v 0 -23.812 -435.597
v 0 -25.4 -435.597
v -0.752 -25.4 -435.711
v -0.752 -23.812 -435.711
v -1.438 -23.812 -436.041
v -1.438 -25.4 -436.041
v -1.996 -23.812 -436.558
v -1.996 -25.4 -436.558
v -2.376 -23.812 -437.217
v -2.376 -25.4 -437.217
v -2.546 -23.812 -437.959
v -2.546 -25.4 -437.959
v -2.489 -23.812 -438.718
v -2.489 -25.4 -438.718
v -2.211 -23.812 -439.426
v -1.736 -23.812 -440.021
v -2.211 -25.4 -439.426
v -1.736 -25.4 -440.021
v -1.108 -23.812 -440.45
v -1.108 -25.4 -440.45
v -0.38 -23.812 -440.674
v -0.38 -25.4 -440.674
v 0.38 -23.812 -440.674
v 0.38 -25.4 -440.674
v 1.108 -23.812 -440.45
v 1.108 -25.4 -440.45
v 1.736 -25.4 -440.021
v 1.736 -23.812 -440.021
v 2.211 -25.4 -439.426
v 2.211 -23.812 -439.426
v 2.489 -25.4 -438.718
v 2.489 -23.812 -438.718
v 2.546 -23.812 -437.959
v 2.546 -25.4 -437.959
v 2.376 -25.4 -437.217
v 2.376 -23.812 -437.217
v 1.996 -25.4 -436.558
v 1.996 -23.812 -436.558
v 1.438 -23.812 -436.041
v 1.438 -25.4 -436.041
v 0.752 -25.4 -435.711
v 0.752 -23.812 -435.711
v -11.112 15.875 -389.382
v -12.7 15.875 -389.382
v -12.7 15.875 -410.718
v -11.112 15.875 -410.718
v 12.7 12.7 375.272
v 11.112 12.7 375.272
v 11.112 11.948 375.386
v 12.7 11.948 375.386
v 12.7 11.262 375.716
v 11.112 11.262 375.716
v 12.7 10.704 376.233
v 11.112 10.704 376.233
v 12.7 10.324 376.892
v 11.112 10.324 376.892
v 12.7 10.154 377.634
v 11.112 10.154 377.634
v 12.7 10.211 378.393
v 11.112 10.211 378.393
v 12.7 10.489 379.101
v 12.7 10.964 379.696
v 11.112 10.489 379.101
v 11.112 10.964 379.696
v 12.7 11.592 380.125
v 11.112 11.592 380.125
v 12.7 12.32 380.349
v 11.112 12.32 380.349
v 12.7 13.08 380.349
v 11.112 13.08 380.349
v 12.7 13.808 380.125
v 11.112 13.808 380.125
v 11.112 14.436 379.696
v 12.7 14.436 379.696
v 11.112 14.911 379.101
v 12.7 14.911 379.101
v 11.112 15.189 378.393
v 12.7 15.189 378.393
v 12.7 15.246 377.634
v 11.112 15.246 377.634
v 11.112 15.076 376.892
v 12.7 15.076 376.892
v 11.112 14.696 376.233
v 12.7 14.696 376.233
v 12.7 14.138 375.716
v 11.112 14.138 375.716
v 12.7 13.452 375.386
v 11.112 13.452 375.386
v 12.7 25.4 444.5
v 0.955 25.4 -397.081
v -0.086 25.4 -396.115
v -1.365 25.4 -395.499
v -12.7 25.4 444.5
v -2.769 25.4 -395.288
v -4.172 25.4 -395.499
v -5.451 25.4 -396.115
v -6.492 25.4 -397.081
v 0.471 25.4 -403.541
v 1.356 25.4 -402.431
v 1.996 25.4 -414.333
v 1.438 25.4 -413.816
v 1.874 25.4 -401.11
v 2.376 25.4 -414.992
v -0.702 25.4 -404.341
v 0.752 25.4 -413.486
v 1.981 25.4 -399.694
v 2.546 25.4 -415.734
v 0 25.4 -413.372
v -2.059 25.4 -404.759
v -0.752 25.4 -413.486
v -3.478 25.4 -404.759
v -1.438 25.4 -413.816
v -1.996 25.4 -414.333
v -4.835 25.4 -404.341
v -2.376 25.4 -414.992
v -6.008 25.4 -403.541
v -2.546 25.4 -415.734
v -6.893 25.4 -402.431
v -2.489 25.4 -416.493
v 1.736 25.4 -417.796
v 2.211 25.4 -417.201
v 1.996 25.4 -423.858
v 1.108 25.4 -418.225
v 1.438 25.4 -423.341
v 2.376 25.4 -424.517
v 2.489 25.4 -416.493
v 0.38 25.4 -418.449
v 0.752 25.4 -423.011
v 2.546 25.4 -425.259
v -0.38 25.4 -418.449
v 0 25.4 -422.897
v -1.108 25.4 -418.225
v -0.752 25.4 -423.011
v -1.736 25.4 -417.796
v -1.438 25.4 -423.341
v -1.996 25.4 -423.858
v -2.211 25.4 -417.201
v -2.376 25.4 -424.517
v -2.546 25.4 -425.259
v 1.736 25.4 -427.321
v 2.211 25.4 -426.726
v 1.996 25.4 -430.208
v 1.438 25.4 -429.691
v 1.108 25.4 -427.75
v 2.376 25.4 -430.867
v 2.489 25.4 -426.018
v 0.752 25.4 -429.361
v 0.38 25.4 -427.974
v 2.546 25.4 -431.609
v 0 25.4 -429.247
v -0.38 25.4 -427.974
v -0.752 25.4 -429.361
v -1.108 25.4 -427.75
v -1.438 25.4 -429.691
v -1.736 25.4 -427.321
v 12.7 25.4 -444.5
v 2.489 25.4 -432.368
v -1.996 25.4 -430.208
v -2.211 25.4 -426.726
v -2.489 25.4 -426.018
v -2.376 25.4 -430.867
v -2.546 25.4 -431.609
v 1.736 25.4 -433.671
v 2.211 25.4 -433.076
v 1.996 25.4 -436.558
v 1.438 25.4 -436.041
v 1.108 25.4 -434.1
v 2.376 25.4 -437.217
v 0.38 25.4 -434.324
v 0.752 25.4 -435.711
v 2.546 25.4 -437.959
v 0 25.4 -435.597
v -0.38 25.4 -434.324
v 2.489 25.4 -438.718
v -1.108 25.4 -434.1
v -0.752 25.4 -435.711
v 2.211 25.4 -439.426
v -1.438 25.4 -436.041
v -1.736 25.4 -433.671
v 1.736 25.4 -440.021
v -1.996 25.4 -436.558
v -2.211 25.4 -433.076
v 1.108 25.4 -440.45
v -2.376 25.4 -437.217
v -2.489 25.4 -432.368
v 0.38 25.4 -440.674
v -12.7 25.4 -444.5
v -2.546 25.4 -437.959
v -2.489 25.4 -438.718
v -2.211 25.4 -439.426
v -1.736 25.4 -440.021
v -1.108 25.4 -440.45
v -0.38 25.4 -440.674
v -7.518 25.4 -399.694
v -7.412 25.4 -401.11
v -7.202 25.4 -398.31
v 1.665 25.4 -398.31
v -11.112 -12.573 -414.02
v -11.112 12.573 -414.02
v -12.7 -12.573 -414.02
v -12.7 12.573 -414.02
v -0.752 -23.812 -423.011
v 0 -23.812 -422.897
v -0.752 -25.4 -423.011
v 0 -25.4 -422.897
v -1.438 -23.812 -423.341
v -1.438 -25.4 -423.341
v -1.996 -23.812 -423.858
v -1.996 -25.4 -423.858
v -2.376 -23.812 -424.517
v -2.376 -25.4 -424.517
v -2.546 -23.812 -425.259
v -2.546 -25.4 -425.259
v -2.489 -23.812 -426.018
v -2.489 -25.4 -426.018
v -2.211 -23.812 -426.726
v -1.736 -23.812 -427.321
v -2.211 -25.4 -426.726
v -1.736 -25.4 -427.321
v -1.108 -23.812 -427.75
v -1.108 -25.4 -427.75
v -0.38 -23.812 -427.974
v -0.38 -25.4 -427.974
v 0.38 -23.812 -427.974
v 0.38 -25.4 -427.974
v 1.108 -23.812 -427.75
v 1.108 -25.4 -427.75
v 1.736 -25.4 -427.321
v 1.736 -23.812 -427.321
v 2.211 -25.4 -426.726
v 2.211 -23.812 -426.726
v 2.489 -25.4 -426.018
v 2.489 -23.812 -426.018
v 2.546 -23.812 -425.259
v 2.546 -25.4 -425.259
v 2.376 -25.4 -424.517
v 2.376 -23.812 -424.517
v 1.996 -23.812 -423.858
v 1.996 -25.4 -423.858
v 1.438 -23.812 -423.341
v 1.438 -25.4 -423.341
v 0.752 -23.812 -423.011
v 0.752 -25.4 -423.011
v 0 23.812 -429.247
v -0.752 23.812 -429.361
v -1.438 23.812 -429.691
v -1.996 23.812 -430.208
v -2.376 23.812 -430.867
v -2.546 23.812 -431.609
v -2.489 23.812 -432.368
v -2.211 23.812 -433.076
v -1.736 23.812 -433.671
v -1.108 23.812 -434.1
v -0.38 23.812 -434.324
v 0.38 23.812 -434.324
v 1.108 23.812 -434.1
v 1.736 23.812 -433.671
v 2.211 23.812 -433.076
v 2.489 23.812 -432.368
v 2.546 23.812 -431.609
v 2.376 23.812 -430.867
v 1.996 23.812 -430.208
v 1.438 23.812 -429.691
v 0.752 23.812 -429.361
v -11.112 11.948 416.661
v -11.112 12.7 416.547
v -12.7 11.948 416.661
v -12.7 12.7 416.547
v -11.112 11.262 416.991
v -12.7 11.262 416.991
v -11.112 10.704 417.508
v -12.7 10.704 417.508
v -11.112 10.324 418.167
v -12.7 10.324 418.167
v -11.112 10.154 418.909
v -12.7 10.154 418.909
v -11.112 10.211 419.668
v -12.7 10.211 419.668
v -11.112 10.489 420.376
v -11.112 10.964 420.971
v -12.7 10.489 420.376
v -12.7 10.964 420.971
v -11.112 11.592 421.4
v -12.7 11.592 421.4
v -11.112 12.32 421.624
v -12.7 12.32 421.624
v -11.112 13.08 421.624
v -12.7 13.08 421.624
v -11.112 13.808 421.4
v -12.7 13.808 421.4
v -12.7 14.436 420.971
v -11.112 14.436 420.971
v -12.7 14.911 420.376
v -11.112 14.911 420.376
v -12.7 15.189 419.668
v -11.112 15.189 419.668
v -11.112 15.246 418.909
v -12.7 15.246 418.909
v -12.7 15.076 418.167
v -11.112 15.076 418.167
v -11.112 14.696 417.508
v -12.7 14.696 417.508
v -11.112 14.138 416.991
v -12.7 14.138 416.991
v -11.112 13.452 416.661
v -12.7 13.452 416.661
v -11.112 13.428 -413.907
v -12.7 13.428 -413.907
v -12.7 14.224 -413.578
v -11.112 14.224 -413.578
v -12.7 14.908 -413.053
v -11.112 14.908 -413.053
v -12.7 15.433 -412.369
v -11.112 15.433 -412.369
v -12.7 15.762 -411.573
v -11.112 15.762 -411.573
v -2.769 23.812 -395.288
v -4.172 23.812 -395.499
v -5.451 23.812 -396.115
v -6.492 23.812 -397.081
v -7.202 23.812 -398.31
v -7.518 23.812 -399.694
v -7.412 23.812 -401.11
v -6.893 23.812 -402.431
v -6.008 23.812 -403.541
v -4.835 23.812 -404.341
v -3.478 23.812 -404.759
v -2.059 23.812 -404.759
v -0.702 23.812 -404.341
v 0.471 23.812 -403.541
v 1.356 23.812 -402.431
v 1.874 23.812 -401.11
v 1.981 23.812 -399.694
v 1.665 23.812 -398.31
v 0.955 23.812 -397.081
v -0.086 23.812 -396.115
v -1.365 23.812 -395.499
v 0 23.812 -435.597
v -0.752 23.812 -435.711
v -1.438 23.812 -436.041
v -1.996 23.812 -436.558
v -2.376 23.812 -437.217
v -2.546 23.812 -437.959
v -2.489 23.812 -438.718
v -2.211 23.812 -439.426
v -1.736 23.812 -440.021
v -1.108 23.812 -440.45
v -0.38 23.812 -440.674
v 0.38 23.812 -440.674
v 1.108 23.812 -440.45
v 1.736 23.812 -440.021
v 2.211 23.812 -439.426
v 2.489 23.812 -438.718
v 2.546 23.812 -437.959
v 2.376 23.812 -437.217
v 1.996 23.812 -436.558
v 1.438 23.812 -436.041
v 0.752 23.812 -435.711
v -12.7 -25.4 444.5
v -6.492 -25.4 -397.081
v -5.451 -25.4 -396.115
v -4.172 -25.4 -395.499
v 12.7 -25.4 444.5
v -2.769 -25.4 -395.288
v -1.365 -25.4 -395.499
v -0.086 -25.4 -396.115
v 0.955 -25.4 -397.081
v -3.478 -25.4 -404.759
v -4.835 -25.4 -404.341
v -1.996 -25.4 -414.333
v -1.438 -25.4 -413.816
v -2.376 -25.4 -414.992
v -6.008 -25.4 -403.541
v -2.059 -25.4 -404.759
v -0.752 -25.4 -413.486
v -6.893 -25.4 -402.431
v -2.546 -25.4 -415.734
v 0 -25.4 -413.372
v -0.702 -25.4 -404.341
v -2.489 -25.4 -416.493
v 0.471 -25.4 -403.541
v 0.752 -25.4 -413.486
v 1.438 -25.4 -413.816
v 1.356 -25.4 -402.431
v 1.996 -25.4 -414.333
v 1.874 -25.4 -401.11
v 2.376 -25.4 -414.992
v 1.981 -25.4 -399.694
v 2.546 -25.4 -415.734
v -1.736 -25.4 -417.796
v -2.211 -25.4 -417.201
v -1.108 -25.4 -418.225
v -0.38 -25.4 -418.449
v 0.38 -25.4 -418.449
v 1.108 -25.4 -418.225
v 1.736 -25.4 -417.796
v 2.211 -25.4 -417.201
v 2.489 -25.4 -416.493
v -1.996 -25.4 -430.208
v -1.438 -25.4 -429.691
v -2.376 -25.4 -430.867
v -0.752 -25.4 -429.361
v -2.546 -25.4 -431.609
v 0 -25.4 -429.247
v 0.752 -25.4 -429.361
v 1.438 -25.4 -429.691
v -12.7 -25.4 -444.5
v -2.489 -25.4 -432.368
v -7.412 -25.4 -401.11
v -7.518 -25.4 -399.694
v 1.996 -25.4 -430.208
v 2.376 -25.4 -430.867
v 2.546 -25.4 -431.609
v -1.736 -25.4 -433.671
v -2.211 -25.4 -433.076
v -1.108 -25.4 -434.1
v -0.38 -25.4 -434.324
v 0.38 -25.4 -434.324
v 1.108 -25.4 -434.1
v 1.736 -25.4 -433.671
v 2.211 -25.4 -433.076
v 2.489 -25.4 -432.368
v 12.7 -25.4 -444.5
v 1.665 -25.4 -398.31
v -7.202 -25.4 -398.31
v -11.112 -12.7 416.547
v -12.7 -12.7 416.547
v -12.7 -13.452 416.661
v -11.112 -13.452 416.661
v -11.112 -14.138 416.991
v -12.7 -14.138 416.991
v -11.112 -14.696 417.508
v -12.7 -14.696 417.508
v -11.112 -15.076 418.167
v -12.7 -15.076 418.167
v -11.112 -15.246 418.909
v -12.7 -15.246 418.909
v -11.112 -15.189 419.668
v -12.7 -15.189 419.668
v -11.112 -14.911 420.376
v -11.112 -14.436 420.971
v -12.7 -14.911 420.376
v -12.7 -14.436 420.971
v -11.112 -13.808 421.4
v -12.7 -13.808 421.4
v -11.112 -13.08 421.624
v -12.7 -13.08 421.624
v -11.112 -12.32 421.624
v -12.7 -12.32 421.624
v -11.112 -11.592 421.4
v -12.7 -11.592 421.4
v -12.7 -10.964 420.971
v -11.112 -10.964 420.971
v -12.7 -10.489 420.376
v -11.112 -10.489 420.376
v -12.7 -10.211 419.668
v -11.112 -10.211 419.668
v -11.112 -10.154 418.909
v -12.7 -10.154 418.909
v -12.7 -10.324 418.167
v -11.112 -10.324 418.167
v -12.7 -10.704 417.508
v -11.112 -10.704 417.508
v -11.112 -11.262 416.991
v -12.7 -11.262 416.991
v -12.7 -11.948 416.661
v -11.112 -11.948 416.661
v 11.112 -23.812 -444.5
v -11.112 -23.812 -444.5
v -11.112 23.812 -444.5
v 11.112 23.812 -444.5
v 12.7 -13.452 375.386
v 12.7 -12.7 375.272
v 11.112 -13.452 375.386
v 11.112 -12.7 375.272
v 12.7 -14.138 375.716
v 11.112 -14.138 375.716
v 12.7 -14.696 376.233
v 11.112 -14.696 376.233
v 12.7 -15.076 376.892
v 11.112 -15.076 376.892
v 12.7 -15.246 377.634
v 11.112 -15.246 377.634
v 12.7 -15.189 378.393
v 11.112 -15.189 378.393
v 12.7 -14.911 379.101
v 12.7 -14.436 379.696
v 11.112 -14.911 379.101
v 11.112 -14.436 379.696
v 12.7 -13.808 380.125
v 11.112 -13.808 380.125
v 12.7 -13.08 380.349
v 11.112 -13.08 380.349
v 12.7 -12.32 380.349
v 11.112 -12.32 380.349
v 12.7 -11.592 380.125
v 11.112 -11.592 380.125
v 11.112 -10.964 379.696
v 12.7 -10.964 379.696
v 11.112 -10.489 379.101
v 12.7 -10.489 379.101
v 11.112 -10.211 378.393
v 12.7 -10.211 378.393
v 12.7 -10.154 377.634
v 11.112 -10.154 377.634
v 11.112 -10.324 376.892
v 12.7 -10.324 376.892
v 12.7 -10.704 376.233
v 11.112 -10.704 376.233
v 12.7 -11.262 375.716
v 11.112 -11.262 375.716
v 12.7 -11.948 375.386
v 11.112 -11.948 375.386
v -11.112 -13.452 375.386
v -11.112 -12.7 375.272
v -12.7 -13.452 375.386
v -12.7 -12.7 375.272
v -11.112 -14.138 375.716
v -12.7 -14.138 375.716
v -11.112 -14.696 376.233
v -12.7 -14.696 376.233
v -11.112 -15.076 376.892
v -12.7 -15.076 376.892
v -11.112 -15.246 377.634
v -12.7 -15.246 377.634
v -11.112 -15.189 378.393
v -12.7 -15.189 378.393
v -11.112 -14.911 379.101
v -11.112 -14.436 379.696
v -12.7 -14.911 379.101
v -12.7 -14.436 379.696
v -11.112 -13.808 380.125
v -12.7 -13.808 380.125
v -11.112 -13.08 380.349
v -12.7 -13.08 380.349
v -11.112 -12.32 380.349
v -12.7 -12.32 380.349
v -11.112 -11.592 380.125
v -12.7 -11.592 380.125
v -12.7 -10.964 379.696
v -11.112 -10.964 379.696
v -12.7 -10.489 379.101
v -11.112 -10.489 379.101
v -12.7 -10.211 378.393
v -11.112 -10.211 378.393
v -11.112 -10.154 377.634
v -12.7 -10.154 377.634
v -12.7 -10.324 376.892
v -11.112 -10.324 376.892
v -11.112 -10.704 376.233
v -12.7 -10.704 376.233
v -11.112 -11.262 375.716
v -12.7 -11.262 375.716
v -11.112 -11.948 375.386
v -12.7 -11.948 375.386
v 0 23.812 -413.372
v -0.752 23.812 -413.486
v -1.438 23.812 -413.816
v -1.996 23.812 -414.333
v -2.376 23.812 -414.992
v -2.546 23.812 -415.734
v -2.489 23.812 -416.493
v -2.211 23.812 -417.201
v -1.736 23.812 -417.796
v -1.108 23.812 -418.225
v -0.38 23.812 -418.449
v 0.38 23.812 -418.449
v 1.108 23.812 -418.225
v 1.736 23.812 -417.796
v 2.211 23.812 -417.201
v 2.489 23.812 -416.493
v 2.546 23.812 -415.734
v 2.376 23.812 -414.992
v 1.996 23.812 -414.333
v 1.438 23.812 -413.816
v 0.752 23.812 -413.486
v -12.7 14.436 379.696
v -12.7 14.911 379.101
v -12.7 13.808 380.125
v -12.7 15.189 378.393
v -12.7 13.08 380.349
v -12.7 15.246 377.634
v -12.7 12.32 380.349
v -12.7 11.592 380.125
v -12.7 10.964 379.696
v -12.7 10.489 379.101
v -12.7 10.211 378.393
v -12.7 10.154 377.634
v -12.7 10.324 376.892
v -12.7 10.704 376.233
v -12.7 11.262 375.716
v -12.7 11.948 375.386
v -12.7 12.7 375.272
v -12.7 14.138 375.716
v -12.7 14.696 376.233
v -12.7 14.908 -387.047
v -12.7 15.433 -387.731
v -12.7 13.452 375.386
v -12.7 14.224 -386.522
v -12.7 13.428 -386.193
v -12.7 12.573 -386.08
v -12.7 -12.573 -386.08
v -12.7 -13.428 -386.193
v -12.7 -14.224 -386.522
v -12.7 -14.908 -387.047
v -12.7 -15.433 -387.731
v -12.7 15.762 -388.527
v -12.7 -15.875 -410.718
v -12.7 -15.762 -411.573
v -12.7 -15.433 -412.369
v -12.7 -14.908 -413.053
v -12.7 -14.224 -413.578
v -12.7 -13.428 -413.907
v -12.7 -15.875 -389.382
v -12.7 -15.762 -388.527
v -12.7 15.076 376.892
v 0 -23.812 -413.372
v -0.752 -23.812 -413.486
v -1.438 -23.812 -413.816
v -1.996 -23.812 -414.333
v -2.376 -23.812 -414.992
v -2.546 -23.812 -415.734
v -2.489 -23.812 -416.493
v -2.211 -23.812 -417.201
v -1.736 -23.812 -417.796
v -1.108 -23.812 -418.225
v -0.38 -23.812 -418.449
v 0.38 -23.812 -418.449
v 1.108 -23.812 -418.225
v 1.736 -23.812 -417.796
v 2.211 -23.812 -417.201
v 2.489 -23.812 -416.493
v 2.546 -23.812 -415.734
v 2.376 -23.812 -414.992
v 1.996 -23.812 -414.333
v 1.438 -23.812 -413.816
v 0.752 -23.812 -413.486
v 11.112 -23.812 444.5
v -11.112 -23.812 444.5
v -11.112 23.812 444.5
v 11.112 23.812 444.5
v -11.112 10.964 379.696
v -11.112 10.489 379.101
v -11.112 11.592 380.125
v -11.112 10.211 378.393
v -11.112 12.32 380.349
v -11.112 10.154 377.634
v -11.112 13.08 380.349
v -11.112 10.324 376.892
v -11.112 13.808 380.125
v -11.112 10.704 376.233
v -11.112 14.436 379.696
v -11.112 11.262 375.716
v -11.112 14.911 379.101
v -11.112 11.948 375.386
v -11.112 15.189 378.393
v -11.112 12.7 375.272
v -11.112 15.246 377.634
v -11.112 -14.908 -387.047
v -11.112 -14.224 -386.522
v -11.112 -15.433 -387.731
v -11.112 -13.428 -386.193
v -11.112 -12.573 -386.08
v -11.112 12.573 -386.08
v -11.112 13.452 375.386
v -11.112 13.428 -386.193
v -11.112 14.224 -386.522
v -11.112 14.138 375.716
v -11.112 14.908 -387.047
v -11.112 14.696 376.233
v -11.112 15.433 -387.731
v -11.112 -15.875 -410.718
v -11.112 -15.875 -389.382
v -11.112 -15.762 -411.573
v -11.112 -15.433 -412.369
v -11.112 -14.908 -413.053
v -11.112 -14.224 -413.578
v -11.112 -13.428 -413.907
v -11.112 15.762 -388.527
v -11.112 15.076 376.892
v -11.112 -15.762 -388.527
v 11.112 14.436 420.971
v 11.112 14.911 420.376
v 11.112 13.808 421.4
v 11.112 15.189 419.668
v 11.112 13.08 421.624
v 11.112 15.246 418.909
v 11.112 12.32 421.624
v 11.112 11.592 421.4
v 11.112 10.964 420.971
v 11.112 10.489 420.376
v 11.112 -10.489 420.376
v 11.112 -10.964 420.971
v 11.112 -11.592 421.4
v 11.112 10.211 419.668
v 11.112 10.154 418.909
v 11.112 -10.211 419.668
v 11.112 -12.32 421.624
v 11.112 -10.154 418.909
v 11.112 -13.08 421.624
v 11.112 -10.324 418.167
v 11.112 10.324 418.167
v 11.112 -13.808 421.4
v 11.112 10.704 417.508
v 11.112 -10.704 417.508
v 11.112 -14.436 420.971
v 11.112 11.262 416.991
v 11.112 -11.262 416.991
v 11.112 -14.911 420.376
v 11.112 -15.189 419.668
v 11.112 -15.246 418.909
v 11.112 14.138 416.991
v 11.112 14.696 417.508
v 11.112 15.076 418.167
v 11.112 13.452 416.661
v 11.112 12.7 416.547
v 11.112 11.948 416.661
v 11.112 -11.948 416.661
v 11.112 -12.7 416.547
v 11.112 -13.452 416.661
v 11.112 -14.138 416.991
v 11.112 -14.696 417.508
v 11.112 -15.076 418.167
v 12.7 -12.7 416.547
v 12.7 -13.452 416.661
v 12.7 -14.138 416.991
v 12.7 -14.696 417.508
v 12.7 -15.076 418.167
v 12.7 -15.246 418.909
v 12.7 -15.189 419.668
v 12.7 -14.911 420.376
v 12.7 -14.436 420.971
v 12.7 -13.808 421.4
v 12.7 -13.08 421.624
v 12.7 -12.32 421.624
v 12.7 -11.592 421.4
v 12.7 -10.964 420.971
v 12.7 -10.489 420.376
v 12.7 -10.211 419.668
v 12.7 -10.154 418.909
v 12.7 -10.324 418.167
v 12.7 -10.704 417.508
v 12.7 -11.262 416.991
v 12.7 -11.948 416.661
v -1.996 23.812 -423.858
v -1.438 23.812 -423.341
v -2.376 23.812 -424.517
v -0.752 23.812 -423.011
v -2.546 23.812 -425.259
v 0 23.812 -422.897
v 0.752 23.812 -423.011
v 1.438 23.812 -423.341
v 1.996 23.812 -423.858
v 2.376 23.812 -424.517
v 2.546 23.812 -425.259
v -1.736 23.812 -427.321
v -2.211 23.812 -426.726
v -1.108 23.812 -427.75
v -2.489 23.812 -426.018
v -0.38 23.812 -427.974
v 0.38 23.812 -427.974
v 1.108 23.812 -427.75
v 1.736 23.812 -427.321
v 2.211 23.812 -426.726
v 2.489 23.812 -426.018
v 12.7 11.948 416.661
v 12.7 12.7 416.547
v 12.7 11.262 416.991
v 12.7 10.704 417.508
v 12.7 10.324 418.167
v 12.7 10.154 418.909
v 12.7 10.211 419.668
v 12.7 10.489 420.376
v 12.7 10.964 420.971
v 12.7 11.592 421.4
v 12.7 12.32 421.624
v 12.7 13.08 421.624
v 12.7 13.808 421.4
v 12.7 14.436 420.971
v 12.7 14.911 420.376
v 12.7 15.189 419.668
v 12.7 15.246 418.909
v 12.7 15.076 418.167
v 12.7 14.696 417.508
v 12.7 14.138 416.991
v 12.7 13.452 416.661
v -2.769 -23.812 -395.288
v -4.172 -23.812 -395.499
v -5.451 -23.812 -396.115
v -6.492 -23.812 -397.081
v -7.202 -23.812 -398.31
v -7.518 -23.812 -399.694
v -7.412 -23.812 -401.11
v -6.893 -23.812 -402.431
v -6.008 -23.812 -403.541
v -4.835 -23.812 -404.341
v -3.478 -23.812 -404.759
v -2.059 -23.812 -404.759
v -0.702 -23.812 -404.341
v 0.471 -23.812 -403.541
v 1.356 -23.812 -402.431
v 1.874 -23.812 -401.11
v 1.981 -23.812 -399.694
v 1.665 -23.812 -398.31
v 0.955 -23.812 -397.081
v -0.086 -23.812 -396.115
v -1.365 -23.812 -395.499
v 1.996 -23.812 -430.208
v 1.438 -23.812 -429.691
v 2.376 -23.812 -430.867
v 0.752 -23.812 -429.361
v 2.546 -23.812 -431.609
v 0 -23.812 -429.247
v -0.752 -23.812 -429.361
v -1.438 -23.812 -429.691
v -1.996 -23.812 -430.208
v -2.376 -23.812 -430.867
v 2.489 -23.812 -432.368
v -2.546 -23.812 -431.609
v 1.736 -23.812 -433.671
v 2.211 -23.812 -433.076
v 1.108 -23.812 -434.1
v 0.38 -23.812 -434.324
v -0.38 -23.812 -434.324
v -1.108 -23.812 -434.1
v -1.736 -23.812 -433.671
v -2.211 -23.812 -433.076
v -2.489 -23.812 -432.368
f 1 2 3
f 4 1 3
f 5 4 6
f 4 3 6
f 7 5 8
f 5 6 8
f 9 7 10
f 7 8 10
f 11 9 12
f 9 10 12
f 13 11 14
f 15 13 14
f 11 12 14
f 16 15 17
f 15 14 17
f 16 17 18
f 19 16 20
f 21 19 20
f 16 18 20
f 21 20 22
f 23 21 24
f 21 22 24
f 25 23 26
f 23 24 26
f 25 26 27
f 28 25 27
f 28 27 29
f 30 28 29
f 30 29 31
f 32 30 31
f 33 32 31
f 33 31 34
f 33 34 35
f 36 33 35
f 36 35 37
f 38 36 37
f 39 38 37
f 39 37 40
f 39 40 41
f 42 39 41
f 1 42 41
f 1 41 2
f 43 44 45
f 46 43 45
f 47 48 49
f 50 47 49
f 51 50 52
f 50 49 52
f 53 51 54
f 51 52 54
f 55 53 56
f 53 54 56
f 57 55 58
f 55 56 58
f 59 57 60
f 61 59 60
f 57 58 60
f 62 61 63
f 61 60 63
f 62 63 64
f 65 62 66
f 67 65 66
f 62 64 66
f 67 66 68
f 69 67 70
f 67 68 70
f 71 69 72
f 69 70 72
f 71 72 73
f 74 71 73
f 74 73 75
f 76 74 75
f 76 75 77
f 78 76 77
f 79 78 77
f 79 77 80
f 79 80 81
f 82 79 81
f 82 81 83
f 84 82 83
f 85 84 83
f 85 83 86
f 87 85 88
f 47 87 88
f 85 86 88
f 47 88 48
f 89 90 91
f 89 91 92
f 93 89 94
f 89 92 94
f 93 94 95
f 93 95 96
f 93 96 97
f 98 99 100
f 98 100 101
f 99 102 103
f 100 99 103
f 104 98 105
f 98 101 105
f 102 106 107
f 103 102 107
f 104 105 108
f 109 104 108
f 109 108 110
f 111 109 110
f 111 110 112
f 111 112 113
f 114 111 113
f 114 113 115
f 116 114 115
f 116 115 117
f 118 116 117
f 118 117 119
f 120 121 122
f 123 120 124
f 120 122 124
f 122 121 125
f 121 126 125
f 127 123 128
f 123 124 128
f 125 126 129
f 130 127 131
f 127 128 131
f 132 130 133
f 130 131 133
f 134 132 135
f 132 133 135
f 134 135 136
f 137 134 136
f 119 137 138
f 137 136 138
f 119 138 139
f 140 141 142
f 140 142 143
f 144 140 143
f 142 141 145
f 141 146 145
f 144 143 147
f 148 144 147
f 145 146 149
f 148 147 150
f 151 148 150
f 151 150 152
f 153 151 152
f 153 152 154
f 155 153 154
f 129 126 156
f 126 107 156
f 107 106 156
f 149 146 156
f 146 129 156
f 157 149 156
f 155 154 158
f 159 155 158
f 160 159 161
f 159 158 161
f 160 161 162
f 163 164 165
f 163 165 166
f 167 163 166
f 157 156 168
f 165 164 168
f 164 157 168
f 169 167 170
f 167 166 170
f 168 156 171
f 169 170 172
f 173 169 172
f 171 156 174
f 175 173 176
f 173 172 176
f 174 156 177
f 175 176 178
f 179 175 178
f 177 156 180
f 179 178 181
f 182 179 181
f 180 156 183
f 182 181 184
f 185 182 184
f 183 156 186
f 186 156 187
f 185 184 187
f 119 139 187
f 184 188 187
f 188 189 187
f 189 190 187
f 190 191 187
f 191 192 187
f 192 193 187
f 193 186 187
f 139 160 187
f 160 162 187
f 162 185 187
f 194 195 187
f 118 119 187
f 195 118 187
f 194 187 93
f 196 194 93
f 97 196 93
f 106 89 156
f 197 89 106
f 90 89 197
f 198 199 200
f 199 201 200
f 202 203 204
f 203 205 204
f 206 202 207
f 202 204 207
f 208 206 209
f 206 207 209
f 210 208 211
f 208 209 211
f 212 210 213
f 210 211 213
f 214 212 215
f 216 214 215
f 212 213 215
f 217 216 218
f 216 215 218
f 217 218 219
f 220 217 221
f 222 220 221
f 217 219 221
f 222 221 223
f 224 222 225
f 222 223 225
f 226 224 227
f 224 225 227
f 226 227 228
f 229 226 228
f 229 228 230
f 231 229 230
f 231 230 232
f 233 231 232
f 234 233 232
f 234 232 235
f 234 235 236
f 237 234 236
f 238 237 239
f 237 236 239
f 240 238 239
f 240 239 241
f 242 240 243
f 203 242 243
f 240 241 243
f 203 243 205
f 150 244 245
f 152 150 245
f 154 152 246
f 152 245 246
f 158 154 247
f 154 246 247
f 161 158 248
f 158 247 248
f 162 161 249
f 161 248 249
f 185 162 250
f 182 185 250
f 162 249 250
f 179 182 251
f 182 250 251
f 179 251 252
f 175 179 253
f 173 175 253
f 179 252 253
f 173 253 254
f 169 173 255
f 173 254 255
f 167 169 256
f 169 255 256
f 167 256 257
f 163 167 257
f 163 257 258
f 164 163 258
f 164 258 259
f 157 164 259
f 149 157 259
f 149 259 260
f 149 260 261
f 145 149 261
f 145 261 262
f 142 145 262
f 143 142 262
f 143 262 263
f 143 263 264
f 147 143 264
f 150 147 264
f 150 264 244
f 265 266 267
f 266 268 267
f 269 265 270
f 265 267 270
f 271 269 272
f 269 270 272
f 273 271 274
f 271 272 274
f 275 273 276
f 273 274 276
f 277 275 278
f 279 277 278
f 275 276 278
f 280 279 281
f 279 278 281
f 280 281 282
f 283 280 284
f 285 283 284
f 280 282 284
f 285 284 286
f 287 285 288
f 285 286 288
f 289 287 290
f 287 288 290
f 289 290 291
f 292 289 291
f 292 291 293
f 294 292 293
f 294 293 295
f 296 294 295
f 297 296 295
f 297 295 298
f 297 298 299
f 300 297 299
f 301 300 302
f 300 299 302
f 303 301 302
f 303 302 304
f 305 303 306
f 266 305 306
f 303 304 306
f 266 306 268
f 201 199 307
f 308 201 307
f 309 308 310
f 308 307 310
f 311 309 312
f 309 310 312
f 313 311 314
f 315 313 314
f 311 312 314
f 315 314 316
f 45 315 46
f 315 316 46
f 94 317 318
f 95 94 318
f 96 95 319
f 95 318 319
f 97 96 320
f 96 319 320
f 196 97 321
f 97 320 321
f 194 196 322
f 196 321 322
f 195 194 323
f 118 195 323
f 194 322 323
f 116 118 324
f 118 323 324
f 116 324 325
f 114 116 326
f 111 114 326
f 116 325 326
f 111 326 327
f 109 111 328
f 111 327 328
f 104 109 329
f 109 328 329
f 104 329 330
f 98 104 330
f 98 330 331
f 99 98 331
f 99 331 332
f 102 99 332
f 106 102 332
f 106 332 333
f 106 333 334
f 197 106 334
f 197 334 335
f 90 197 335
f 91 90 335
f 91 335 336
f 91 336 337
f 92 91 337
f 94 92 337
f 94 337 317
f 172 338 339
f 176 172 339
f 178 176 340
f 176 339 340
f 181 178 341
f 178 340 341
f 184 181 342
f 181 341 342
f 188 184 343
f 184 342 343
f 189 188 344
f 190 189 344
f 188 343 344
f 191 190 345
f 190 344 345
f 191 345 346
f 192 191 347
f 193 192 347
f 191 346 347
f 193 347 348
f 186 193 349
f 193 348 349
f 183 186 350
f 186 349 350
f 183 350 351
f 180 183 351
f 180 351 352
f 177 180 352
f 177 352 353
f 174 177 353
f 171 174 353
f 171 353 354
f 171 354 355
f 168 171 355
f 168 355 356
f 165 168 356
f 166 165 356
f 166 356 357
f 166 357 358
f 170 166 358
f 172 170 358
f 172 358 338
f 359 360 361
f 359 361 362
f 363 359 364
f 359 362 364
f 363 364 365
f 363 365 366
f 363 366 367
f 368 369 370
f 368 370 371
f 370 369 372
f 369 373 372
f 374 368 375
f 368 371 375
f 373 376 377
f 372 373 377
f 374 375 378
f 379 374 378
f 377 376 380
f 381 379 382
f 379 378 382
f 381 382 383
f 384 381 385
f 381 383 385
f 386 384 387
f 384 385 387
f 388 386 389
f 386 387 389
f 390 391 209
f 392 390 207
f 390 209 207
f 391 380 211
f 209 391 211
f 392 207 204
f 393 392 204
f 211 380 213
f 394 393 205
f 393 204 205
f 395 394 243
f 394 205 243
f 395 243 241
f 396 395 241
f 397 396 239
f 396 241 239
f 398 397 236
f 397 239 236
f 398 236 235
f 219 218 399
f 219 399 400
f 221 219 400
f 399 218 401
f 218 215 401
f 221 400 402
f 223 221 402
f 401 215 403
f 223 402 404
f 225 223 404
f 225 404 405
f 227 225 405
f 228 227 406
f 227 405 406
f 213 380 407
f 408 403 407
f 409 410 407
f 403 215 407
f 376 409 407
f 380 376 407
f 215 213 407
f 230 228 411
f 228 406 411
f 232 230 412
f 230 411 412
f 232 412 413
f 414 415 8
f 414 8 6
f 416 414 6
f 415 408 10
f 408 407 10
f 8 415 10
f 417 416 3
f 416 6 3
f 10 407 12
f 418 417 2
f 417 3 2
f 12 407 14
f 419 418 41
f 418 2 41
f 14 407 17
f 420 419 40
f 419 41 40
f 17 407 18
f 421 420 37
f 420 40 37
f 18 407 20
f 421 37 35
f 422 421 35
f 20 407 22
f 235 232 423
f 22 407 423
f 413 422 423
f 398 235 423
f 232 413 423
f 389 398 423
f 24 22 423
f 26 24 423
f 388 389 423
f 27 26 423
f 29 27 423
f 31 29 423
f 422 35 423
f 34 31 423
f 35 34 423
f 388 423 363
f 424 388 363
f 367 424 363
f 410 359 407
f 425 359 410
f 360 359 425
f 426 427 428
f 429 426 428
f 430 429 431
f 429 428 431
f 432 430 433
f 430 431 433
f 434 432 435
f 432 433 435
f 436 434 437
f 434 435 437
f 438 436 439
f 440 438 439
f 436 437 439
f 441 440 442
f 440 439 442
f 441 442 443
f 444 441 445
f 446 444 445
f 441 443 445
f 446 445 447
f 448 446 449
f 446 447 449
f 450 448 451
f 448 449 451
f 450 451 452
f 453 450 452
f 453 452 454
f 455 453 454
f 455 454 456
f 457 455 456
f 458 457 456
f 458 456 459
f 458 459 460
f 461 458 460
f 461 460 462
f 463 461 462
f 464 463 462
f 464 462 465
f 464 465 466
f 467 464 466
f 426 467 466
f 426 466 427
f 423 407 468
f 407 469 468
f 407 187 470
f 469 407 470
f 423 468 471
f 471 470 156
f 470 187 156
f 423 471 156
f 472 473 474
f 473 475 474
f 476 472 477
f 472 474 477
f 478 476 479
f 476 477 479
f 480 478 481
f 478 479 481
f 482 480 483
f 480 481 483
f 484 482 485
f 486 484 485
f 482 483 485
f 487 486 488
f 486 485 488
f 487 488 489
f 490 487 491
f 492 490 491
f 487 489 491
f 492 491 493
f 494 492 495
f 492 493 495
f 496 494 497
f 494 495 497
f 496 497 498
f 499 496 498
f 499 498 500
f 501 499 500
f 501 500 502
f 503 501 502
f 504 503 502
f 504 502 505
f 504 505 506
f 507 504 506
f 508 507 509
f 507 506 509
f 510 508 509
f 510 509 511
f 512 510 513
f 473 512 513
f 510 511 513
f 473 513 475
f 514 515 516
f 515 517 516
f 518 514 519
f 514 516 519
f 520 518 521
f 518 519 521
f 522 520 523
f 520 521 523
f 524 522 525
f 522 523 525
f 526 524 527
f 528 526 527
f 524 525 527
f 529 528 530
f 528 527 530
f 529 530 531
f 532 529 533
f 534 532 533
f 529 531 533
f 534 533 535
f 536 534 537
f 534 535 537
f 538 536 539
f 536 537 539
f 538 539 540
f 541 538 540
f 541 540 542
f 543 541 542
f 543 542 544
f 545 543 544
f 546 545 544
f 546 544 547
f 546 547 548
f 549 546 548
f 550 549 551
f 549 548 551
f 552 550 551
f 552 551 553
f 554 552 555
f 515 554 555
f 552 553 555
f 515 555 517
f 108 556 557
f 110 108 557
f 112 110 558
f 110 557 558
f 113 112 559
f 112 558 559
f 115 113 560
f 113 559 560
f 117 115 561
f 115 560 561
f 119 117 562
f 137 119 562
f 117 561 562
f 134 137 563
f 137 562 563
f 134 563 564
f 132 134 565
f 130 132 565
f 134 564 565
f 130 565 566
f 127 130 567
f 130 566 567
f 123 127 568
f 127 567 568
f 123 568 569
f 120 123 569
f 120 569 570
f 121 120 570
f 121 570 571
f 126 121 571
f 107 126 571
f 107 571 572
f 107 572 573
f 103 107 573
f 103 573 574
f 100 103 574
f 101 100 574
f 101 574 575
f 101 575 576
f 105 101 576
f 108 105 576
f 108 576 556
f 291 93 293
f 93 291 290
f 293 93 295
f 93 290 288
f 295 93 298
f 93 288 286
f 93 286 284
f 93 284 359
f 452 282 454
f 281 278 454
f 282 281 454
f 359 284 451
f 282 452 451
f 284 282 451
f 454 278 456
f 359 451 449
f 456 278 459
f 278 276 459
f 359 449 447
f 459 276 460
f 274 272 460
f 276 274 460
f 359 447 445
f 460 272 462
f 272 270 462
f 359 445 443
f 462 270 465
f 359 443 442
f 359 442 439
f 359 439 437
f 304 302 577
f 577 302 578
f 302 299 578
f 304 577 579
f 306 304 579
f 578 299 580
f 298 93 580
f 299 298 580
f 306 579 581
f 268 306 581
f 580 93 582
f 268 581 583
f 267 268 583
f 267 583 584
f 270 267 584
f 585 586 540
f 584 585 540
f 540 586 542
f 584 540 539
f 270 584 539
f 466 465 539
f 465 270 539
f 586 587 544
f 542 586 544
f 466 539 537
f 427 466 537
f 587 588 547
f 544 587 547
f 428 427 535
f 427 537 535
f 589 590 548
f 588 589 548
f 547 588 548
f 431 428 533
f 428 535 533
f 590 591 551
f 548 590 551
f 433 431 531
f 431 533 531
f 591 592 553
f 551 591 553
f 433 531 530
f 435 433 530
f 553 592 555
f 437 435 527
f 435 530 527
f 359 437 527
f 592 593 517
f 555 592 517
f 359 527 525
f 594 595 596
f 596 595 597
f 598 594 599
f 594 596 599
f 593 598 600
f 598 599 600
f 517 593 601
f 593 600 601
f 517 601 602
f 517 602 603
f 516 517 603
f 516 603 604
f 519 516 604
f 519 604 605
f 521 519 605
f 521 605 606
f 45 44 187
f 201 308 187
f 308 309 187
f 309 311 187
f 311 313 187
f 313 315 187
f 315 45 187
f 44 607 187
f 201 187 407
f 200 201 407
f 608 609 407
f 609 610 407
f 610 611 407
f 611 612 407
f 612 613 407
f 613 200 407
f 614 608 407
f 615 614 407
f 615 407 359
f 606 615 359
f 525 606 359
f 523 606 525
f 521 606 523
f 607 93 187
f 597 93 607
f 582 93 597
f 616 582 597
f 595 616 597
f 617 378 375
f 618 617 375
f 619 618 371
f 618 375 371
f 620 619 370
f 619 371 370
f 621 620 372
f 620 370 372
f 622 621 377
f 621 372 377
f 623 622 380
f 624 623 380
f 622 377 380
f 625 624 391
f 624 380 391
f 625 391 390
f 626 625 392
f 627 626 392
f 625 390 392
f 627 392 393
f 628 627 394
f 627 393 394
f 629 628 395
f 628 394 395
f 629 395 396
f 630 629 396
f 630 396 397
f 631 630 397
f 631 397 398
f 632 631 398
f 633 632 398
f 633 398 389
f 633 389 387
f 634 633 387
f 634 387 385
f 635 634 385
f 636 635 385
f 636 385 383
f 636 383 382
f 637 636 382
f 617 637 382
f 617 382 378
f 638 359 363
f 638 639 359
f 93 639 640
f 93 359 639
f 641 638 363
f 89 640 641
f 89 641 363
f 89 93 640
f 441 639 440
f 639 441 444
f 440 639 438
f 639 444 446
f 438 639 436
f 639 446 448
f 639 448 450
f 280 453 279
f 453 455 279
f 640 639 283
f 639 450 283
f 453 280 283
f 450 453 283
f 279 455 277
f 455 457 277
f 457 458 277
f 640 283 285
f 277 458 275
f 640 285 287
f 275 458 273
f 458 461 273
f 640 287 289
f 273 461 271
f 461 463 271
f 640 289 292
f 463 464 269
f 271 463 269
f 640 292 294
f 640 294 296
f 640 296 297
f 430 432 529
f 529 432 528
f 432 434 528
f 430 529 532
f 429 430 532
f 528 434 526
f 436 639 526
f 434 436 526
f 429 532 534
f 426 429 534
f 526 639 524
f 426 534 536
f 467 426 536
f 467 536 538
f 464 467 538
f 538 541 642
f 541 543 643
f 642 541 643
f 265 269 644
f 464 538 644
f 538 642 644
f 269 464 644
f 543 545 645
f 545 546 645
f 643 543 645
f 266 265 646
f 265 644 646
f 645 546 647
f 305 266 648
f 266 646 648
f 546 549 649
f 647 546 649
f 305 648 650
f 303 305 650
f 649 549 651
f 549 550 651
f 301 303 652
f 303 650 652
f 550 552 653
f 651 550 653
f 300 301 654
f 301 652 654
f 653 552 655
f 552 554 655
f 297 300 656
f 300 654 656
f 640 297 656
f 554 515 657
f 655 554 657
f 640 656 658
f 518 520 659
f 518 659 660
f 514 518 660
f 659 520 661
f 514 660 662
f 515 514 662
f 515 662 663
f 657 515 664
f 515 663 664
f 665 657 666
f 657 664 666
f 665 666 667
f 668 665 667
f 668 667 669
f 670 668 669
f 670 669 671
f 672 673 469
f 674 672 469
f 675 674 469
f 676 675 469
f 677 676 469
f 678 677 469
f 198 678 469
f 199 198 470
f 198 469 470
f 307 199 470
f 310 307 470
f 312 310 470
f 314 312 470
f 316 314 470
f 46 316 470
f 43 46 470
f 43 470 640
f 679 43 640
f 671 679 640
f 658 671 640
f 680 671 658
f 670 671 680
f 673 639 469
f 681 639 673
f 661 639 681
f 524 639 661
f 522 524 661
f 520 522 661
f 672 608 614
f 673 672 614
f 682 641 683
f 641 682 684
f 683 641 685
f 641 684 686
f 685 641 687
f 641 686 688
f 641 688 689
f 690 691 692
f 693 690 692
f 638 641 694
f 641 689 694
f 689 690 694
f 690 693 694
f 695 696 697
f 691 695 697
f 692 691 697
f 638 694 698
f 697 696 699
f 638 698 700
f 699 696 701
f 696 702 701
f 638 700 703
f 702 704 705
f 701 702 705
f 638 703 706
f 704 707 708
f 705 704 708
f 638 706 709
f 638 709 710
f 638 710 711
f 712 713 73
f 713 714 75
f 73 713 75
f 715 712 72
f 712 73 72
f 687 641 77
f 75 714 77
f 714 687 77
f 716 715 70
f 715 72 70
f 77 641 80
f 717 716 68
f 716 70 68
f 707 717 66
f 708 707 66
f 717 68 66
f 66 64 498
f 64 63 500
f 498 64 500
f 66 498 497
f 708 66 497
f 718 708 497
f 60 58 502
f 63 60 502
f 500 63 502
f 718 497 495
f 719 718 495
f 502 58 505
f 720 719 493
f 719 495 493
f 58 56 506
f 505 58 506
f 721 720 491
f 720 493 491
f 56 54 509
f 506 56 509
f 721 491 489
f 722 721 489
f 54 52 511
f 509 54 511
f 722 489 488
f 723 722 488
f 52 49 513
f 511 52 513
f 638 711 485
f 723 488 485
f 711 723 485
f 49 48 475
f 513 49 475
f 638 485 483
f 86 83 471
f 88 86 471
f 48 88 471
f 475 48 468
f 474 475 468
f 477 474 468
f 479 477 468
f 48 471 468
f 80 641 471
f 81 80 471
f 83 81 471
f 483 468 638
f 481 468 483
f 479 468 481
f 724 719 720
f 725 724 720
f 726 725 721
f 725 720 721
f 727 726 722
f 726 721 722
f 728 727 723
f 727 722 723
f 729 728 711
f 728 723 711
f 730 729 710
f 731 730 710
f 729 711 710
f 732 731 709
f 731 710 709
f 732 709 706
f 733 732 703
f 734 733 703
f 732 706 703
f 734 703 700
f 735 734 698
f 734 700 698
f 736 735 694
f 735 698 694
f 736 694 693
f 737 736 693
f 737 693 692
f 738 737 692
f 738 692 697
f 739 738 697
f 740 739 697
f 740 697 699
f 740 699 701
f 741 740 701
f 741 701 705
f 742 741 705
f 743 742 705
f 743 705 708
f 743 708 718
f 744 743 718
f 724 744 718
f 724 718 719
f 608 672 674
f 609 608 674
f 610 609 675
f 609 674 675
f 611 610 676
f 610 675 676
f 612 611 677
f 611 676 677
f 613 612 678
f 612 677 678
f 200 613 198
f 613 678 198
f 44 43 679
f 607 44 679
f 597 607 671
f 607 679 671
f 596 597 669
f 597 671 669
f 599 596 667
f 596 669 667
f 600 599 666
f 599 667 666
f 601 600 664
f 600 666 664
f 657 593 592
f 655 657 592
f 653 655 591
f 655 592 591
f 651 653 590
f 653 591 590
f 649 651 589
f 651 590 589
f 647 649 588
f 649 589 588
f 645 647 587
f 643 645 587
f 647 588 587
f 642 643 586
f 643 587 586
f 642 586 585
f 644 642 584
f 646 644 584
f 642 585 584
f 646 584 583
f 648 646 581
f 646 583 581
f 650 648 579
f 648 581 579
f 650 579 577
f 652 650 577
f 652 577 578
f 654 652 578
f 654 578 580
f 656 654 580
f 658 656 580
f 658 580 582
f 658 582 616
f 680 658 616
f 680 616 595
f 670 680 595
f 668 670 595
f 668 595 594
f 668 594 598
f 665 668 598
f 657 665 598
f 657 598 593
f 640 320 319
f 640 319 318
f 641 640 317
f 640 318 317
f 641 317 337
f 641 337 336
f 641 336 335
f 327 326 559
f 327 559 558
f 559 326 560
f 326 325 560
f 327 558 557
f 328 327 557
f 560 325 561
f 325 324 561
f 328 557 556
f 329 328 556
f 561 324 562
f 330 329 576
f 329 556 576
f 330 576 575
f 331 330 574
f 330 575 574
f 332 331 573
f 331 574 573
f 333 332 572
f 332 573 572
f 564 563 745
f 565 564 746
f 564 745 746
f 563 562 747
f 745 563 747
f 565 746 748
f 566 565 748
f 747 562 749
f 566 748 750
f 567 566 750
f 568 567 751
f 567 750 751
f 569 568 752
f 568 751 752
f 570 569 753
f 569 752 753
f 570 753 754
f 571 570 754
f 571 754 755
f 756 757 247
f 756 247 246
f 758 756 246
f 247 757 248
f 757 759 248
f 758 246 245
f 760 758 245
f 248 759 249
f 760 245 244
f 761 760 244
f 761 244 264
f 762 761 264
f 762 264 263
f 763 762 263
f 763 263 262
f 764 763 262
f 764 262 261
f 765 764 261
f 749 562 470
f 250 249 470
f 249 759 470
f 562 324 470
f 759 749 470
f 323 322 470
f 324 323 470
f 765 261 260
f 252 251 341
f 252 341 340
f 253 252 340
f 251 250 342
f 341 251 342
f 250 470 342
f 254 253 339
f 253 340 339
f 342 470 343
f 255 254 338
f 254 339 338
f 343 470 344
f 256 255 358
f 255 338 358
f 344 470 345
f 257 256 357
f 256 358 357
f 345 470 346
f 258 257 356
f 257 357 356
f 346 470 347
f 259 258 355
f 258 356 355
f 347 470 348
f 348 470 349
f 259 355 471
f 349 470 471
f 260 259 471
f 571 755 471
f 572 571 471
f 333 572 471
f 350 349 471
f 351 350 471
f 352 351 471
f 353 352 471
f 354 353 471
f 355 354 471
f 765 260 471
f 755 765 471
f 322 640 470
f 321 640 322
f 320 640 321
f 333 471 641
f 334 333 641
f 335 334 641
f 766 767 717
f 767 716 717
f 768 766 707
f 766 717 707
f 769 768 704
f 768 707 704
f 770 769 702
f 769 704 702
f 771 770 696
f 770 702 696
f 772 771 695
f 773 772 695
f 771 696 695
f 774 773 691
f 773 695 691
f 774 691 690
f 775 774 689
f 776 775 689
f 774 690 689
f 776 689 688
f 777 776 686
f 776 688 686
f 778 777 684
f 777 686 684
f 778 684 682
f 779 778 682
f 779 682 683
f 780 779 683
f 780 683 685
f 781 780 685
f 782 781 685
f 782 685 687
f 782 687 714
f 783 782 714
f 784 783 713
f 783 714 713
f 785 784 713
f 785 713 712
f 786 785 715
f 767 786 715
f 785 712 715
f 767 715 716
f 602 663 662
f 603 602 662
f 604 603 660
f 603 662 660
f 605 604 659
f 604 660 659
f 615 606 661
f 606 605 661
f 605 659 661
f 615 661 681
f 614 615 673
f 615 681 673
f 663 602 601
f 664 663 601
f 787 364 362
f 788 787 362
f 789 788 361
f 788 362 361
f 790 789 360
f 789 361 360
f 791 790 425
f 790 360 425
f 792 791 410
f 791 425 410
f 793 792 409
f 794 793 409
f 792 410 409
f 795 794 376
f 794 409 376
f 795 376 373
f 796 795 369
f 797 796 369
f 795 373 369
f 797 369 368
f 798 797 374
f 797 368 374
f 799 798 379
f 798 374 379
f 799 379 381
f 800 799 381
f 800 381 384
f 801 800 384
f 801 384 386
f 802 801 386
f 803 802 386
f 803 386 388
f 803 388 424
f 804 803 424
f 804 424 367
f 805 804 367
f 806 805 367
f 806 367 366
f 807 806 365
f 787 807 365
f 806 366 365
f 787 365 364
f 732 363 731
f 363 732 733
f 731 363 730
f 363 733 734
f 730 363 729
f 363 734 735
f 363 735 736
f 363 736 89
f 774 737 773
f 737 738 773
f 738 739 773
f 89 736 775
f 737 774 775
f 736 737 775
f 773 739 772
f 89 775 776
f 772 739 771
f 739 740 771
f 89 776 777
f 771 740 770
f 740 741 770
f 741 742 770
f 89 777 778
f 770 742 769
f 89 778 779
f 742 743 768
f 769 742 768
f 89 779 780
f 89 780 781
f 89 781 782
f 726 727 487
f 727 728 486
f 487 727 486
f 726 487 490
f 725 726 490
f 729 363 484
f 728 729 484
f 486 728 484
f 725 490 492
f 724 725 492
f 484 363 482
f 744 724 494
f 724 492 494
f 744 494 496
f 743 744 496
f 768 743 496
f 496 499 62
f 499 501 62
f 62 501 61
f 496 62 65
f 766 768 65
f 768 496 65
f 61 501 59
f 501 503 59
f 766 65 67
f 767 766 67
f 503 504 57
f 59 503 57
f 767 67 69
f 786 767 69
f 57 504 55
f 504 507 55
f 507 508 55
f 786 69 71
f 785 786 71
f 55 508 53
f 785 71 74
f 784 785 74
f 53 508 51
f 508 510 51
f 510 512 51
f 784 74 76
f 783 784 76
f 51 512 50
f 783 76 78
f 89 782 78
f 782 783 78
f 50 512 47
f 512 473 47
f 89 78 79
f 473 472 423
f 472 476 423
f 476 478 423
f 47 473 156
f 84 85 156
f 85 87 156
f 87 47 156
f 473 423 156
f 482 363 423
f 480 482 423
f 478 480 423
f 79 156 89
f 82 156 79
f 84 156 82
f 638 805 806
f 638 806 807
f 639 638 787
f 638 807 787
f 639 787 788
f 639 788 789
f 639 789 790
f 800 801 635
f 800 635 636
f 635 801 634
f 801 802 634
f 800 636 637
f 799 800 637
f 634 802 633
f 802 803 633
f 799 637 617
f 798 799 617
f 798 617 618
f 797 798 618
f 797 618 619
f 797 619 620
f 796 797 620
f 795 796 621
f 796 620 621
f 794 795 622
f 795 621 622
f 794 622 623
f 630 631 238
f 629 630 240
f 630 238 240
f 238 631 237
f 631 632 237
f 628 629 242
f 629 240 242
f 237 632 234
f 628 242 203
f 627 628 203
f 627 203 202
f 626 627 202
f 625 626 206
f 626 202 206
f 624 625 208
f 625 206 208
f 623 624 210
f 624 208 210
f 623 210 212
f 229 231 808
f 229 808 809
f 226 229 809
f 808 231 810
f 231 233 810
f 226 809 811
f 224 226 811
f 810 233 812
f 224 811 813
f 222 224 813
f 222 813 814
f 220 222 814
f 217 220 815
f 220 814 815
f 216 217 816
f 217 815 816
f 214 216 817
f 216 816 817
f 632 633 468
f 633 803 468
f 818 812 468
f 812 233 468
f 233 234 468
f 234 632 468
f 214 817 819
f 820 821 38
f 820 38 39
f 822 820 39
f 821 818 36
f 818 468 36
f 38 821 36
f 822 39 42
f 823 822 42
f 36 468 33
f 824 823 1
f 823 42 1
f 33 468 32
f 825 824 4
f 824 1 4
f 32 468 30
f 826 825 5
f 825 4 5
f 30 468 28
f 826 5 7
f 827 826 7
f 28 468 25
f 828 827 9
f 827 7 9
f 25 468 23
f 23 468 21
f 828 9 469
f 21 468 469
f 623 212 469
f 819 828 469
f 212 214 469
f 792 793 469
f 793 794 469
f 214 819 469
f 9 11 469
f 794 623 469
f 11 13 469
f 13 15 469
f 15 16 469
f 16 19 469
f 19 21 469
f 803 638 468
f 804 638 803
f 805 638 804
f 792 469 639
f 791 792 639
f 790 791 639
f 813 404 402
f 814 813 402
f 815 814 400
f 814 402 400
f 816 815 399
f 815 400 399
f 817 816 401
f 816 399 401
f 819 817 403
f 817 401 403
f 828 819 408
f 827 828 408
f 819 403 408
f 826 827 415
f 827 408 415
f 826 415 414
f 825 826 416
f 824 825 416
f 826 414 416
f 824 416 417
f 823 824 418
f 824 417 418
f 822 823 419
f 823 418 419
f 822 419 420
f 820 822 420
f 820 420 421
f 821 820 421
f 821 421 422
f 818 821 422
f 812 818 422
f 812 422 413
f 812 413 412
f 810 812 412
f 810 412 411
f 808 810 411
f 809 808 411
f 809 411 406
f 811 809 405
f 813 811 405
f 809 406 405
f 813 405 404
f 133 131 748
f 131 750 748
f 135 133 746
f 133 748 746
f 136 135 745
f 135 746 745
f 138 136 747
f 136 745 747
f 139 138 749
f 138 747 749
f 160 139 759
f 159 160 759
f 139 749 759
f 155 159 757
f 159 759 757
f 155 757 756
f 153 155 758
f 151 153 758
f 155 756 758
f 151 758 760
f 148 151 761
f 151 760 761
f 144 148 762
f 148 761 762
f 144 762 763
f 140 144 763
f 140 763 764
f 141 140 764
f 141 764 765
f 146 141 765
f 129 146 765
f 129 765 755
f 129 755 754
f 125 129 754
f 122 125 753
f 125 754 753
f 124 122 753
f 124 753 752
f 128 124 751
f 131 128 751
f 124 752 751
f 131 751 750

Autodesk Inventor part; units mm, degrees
ref_plane "YZ Plane" through (0, 0, 0) normal (1, 0, 0) x (0, 1, 0)
ref_plane "XZ Plane" through (0, 0, 0) normal (0, 1, 0) x (-1, 0, 0)
ref_plane "XY Plane" through (0, 0, 0) normal (0, 0, 1) x (1, 0, 0)
sketch "Sketch1" plane through (0, 0, 0) normal (0, 0, 1) x (1, 0, 0)
  line L0 (-12.7, -25.4) -> (12.7, -25.4)
  line L1 (12.7, -25.4) -> (12.7, 25.4)
  line L2 (12.7, 25.4) -> (-12.7, 25.4)
  line L3 (-12.7, 25.4) -> (-12.7, -25.4)
  line L4 (-12.7, -25.4) -> (12.7, 25.4) construction
  line L5 (12.7, -25.4) -> (-12.7, 25.4) construction
  line L6 (-11.1125, 23.8125) -> (11.1125, 23.8125)
  line L7 (11.1125, 23.8125) -> (11.1125, -23.8125)
  line L8 (11.1125, -23.8125) -> (-11.1125, -23.8125)
  line L9 (-11.1125, -23.8125) -> (-11.1125, 23.8125)
  point P0 (0, 0)
  dimension "width" = 25.4
  dimension "height" = 50.8
  dimension "thickness" = 1.5875
extrude "Extrusion1" add sketch "Sketch1" along normal mid plane 889
sketch "Sketch2" plane through (-12.7, 25.4, 444.5) normal (0, 1, 0) x (1, 0, 0)
  line L0 (0, 889) -> (0, 0) projected
  line L1 (0, 889) -> (25.4, 889) projected
  point P0 (12.7, 444.5)
  point P1 (12.7, 882.65)
  point P2 (12.7, 876.3)
  point P3 (12.7, 869.95)
  point P4 (12.7, 889)
  point P5 (12.7, 860.425)
  dimension "d5" = 12.7
  dimension "d6" = 6.35
  dimension "d7" = 6.35
  dimension "d8" = 6.35
  dimension "d45" = 9.525
hole "Hole1" at (0, 25.4, -438.15) at (0, 25.4, -431.8) at (0, 25.4, -425.45) at (0, 25.4, -415.925) direction (0, -1, 0) diameter 5.1054 end through all clearance for "Flat Head Machine Screw (82)" size "#10" standard "Ansi Unified Screw Threads"
sketch "Sketch4" plane through (-12.7, 25.4, 444.5) normal (0, 1, 0) x (1, 0, 0)
  circle A0 centre (9.9314, 844.55) radius 10.3124 construction
  line L0 (0, 889) -> (0, 0) construction
  circle A1 centre (12.7, 869.95) radius 2.5527 construction
  point P0 (12.7, 444.5)
  dimension "d27" = 20.6248
  dimension "d28" = 9.9314
  dimension "d29" = 25.4
hole "Hole3" at (-2.7686, 25.4, -400.05) direction (0, -1, 0) diameter 9.525 end through all
sketch "Sketch5" plane through (-12.7, -25.4, 444.5) normal (-1, 0, 0) x (0, 0, 1)
  line L0 (-830.58, 41.275) -> (-858.52, 41.275)
  line L1 (-858.52, 41.275) -> (-858.52, 9.525)
  line L2 (-858.52, 9.525) -> (-830.58, 9.525)
  line L3 (-830.58, 9.525) -> (-830.58, 41.275)
  line L4 (-830.58, 41.275) -> (-858.52, 9.525) construction
  line L5 (-858.52, 41.275) -> (-830.58, 9.525) construction
  line L6 (0, 0) -> (-889, 0) projected
  line L7 (-889, 0) -> (-889, 50.8) projected
  point P0 (-444.5, 25.4)
  point P1 (-844.55, 25.4)
  point P2 (-858.52, 25.4)
  point P3 (-889, 25.4)
  point P4 (-889, 25.4)
  dimension "d37" = 27.94
  dimension "d38" = 31.75
  dimension "d43" = 44.45
extrude "Extrusion2" cut sketch "Sketch5" against normal blind 1.5875
fillet "Fillet1" radius 3.302 4 edges at (-11.9062, -15.875, -414.02) (-11.9062, 15.875, -414.02) (-11.9062, 15.875, -386.08) (-11.9062, -15.875, -386.08)
sketch "Sketch6" plane through (12.7, -25.4, 444.5) normal (1, 0, 0) x (0, 0, -1)
  line L0 (889, 50.8) -> (0, 50.8) construction
  line L1 (0, 0) -> (0, 50.8) construction
  line L2 (889, 0) -> (0, 0) construction
  line L3 (889, 50.8) -> (889, 0) construction
  point P0 (444.5, 25.4)
  point P1 (25.4, 38.1)
  point P2 (25.4, 12.7)
  point P3 (66.675, 38.1)
  point P4 (66.675, 12.7)
  dimension "d46" = 25.4
  dimension "d47" = 12.7
  dimension "d48" = 12.7
  dimension "d49" = 41.275
hole "Hole4" at (12.7, 12.7, 419.1) at (12.7, -12.7, 419.1) at (12.7, 12.7, 377.825) at (12.7, -12.7, 377.825) direction (-1, 0, 0) diameter 5.1054 end through all clearance for "Flat Head Machine Screw (82)" size "#10" standard "Ansi Unified Screw Threads"
equation "\"d7\" = d6"
equation "\"d8\" = d6"
equation "\"d48\" = d47"
properties part number "EL2-001" material "Aluminum 6061"
